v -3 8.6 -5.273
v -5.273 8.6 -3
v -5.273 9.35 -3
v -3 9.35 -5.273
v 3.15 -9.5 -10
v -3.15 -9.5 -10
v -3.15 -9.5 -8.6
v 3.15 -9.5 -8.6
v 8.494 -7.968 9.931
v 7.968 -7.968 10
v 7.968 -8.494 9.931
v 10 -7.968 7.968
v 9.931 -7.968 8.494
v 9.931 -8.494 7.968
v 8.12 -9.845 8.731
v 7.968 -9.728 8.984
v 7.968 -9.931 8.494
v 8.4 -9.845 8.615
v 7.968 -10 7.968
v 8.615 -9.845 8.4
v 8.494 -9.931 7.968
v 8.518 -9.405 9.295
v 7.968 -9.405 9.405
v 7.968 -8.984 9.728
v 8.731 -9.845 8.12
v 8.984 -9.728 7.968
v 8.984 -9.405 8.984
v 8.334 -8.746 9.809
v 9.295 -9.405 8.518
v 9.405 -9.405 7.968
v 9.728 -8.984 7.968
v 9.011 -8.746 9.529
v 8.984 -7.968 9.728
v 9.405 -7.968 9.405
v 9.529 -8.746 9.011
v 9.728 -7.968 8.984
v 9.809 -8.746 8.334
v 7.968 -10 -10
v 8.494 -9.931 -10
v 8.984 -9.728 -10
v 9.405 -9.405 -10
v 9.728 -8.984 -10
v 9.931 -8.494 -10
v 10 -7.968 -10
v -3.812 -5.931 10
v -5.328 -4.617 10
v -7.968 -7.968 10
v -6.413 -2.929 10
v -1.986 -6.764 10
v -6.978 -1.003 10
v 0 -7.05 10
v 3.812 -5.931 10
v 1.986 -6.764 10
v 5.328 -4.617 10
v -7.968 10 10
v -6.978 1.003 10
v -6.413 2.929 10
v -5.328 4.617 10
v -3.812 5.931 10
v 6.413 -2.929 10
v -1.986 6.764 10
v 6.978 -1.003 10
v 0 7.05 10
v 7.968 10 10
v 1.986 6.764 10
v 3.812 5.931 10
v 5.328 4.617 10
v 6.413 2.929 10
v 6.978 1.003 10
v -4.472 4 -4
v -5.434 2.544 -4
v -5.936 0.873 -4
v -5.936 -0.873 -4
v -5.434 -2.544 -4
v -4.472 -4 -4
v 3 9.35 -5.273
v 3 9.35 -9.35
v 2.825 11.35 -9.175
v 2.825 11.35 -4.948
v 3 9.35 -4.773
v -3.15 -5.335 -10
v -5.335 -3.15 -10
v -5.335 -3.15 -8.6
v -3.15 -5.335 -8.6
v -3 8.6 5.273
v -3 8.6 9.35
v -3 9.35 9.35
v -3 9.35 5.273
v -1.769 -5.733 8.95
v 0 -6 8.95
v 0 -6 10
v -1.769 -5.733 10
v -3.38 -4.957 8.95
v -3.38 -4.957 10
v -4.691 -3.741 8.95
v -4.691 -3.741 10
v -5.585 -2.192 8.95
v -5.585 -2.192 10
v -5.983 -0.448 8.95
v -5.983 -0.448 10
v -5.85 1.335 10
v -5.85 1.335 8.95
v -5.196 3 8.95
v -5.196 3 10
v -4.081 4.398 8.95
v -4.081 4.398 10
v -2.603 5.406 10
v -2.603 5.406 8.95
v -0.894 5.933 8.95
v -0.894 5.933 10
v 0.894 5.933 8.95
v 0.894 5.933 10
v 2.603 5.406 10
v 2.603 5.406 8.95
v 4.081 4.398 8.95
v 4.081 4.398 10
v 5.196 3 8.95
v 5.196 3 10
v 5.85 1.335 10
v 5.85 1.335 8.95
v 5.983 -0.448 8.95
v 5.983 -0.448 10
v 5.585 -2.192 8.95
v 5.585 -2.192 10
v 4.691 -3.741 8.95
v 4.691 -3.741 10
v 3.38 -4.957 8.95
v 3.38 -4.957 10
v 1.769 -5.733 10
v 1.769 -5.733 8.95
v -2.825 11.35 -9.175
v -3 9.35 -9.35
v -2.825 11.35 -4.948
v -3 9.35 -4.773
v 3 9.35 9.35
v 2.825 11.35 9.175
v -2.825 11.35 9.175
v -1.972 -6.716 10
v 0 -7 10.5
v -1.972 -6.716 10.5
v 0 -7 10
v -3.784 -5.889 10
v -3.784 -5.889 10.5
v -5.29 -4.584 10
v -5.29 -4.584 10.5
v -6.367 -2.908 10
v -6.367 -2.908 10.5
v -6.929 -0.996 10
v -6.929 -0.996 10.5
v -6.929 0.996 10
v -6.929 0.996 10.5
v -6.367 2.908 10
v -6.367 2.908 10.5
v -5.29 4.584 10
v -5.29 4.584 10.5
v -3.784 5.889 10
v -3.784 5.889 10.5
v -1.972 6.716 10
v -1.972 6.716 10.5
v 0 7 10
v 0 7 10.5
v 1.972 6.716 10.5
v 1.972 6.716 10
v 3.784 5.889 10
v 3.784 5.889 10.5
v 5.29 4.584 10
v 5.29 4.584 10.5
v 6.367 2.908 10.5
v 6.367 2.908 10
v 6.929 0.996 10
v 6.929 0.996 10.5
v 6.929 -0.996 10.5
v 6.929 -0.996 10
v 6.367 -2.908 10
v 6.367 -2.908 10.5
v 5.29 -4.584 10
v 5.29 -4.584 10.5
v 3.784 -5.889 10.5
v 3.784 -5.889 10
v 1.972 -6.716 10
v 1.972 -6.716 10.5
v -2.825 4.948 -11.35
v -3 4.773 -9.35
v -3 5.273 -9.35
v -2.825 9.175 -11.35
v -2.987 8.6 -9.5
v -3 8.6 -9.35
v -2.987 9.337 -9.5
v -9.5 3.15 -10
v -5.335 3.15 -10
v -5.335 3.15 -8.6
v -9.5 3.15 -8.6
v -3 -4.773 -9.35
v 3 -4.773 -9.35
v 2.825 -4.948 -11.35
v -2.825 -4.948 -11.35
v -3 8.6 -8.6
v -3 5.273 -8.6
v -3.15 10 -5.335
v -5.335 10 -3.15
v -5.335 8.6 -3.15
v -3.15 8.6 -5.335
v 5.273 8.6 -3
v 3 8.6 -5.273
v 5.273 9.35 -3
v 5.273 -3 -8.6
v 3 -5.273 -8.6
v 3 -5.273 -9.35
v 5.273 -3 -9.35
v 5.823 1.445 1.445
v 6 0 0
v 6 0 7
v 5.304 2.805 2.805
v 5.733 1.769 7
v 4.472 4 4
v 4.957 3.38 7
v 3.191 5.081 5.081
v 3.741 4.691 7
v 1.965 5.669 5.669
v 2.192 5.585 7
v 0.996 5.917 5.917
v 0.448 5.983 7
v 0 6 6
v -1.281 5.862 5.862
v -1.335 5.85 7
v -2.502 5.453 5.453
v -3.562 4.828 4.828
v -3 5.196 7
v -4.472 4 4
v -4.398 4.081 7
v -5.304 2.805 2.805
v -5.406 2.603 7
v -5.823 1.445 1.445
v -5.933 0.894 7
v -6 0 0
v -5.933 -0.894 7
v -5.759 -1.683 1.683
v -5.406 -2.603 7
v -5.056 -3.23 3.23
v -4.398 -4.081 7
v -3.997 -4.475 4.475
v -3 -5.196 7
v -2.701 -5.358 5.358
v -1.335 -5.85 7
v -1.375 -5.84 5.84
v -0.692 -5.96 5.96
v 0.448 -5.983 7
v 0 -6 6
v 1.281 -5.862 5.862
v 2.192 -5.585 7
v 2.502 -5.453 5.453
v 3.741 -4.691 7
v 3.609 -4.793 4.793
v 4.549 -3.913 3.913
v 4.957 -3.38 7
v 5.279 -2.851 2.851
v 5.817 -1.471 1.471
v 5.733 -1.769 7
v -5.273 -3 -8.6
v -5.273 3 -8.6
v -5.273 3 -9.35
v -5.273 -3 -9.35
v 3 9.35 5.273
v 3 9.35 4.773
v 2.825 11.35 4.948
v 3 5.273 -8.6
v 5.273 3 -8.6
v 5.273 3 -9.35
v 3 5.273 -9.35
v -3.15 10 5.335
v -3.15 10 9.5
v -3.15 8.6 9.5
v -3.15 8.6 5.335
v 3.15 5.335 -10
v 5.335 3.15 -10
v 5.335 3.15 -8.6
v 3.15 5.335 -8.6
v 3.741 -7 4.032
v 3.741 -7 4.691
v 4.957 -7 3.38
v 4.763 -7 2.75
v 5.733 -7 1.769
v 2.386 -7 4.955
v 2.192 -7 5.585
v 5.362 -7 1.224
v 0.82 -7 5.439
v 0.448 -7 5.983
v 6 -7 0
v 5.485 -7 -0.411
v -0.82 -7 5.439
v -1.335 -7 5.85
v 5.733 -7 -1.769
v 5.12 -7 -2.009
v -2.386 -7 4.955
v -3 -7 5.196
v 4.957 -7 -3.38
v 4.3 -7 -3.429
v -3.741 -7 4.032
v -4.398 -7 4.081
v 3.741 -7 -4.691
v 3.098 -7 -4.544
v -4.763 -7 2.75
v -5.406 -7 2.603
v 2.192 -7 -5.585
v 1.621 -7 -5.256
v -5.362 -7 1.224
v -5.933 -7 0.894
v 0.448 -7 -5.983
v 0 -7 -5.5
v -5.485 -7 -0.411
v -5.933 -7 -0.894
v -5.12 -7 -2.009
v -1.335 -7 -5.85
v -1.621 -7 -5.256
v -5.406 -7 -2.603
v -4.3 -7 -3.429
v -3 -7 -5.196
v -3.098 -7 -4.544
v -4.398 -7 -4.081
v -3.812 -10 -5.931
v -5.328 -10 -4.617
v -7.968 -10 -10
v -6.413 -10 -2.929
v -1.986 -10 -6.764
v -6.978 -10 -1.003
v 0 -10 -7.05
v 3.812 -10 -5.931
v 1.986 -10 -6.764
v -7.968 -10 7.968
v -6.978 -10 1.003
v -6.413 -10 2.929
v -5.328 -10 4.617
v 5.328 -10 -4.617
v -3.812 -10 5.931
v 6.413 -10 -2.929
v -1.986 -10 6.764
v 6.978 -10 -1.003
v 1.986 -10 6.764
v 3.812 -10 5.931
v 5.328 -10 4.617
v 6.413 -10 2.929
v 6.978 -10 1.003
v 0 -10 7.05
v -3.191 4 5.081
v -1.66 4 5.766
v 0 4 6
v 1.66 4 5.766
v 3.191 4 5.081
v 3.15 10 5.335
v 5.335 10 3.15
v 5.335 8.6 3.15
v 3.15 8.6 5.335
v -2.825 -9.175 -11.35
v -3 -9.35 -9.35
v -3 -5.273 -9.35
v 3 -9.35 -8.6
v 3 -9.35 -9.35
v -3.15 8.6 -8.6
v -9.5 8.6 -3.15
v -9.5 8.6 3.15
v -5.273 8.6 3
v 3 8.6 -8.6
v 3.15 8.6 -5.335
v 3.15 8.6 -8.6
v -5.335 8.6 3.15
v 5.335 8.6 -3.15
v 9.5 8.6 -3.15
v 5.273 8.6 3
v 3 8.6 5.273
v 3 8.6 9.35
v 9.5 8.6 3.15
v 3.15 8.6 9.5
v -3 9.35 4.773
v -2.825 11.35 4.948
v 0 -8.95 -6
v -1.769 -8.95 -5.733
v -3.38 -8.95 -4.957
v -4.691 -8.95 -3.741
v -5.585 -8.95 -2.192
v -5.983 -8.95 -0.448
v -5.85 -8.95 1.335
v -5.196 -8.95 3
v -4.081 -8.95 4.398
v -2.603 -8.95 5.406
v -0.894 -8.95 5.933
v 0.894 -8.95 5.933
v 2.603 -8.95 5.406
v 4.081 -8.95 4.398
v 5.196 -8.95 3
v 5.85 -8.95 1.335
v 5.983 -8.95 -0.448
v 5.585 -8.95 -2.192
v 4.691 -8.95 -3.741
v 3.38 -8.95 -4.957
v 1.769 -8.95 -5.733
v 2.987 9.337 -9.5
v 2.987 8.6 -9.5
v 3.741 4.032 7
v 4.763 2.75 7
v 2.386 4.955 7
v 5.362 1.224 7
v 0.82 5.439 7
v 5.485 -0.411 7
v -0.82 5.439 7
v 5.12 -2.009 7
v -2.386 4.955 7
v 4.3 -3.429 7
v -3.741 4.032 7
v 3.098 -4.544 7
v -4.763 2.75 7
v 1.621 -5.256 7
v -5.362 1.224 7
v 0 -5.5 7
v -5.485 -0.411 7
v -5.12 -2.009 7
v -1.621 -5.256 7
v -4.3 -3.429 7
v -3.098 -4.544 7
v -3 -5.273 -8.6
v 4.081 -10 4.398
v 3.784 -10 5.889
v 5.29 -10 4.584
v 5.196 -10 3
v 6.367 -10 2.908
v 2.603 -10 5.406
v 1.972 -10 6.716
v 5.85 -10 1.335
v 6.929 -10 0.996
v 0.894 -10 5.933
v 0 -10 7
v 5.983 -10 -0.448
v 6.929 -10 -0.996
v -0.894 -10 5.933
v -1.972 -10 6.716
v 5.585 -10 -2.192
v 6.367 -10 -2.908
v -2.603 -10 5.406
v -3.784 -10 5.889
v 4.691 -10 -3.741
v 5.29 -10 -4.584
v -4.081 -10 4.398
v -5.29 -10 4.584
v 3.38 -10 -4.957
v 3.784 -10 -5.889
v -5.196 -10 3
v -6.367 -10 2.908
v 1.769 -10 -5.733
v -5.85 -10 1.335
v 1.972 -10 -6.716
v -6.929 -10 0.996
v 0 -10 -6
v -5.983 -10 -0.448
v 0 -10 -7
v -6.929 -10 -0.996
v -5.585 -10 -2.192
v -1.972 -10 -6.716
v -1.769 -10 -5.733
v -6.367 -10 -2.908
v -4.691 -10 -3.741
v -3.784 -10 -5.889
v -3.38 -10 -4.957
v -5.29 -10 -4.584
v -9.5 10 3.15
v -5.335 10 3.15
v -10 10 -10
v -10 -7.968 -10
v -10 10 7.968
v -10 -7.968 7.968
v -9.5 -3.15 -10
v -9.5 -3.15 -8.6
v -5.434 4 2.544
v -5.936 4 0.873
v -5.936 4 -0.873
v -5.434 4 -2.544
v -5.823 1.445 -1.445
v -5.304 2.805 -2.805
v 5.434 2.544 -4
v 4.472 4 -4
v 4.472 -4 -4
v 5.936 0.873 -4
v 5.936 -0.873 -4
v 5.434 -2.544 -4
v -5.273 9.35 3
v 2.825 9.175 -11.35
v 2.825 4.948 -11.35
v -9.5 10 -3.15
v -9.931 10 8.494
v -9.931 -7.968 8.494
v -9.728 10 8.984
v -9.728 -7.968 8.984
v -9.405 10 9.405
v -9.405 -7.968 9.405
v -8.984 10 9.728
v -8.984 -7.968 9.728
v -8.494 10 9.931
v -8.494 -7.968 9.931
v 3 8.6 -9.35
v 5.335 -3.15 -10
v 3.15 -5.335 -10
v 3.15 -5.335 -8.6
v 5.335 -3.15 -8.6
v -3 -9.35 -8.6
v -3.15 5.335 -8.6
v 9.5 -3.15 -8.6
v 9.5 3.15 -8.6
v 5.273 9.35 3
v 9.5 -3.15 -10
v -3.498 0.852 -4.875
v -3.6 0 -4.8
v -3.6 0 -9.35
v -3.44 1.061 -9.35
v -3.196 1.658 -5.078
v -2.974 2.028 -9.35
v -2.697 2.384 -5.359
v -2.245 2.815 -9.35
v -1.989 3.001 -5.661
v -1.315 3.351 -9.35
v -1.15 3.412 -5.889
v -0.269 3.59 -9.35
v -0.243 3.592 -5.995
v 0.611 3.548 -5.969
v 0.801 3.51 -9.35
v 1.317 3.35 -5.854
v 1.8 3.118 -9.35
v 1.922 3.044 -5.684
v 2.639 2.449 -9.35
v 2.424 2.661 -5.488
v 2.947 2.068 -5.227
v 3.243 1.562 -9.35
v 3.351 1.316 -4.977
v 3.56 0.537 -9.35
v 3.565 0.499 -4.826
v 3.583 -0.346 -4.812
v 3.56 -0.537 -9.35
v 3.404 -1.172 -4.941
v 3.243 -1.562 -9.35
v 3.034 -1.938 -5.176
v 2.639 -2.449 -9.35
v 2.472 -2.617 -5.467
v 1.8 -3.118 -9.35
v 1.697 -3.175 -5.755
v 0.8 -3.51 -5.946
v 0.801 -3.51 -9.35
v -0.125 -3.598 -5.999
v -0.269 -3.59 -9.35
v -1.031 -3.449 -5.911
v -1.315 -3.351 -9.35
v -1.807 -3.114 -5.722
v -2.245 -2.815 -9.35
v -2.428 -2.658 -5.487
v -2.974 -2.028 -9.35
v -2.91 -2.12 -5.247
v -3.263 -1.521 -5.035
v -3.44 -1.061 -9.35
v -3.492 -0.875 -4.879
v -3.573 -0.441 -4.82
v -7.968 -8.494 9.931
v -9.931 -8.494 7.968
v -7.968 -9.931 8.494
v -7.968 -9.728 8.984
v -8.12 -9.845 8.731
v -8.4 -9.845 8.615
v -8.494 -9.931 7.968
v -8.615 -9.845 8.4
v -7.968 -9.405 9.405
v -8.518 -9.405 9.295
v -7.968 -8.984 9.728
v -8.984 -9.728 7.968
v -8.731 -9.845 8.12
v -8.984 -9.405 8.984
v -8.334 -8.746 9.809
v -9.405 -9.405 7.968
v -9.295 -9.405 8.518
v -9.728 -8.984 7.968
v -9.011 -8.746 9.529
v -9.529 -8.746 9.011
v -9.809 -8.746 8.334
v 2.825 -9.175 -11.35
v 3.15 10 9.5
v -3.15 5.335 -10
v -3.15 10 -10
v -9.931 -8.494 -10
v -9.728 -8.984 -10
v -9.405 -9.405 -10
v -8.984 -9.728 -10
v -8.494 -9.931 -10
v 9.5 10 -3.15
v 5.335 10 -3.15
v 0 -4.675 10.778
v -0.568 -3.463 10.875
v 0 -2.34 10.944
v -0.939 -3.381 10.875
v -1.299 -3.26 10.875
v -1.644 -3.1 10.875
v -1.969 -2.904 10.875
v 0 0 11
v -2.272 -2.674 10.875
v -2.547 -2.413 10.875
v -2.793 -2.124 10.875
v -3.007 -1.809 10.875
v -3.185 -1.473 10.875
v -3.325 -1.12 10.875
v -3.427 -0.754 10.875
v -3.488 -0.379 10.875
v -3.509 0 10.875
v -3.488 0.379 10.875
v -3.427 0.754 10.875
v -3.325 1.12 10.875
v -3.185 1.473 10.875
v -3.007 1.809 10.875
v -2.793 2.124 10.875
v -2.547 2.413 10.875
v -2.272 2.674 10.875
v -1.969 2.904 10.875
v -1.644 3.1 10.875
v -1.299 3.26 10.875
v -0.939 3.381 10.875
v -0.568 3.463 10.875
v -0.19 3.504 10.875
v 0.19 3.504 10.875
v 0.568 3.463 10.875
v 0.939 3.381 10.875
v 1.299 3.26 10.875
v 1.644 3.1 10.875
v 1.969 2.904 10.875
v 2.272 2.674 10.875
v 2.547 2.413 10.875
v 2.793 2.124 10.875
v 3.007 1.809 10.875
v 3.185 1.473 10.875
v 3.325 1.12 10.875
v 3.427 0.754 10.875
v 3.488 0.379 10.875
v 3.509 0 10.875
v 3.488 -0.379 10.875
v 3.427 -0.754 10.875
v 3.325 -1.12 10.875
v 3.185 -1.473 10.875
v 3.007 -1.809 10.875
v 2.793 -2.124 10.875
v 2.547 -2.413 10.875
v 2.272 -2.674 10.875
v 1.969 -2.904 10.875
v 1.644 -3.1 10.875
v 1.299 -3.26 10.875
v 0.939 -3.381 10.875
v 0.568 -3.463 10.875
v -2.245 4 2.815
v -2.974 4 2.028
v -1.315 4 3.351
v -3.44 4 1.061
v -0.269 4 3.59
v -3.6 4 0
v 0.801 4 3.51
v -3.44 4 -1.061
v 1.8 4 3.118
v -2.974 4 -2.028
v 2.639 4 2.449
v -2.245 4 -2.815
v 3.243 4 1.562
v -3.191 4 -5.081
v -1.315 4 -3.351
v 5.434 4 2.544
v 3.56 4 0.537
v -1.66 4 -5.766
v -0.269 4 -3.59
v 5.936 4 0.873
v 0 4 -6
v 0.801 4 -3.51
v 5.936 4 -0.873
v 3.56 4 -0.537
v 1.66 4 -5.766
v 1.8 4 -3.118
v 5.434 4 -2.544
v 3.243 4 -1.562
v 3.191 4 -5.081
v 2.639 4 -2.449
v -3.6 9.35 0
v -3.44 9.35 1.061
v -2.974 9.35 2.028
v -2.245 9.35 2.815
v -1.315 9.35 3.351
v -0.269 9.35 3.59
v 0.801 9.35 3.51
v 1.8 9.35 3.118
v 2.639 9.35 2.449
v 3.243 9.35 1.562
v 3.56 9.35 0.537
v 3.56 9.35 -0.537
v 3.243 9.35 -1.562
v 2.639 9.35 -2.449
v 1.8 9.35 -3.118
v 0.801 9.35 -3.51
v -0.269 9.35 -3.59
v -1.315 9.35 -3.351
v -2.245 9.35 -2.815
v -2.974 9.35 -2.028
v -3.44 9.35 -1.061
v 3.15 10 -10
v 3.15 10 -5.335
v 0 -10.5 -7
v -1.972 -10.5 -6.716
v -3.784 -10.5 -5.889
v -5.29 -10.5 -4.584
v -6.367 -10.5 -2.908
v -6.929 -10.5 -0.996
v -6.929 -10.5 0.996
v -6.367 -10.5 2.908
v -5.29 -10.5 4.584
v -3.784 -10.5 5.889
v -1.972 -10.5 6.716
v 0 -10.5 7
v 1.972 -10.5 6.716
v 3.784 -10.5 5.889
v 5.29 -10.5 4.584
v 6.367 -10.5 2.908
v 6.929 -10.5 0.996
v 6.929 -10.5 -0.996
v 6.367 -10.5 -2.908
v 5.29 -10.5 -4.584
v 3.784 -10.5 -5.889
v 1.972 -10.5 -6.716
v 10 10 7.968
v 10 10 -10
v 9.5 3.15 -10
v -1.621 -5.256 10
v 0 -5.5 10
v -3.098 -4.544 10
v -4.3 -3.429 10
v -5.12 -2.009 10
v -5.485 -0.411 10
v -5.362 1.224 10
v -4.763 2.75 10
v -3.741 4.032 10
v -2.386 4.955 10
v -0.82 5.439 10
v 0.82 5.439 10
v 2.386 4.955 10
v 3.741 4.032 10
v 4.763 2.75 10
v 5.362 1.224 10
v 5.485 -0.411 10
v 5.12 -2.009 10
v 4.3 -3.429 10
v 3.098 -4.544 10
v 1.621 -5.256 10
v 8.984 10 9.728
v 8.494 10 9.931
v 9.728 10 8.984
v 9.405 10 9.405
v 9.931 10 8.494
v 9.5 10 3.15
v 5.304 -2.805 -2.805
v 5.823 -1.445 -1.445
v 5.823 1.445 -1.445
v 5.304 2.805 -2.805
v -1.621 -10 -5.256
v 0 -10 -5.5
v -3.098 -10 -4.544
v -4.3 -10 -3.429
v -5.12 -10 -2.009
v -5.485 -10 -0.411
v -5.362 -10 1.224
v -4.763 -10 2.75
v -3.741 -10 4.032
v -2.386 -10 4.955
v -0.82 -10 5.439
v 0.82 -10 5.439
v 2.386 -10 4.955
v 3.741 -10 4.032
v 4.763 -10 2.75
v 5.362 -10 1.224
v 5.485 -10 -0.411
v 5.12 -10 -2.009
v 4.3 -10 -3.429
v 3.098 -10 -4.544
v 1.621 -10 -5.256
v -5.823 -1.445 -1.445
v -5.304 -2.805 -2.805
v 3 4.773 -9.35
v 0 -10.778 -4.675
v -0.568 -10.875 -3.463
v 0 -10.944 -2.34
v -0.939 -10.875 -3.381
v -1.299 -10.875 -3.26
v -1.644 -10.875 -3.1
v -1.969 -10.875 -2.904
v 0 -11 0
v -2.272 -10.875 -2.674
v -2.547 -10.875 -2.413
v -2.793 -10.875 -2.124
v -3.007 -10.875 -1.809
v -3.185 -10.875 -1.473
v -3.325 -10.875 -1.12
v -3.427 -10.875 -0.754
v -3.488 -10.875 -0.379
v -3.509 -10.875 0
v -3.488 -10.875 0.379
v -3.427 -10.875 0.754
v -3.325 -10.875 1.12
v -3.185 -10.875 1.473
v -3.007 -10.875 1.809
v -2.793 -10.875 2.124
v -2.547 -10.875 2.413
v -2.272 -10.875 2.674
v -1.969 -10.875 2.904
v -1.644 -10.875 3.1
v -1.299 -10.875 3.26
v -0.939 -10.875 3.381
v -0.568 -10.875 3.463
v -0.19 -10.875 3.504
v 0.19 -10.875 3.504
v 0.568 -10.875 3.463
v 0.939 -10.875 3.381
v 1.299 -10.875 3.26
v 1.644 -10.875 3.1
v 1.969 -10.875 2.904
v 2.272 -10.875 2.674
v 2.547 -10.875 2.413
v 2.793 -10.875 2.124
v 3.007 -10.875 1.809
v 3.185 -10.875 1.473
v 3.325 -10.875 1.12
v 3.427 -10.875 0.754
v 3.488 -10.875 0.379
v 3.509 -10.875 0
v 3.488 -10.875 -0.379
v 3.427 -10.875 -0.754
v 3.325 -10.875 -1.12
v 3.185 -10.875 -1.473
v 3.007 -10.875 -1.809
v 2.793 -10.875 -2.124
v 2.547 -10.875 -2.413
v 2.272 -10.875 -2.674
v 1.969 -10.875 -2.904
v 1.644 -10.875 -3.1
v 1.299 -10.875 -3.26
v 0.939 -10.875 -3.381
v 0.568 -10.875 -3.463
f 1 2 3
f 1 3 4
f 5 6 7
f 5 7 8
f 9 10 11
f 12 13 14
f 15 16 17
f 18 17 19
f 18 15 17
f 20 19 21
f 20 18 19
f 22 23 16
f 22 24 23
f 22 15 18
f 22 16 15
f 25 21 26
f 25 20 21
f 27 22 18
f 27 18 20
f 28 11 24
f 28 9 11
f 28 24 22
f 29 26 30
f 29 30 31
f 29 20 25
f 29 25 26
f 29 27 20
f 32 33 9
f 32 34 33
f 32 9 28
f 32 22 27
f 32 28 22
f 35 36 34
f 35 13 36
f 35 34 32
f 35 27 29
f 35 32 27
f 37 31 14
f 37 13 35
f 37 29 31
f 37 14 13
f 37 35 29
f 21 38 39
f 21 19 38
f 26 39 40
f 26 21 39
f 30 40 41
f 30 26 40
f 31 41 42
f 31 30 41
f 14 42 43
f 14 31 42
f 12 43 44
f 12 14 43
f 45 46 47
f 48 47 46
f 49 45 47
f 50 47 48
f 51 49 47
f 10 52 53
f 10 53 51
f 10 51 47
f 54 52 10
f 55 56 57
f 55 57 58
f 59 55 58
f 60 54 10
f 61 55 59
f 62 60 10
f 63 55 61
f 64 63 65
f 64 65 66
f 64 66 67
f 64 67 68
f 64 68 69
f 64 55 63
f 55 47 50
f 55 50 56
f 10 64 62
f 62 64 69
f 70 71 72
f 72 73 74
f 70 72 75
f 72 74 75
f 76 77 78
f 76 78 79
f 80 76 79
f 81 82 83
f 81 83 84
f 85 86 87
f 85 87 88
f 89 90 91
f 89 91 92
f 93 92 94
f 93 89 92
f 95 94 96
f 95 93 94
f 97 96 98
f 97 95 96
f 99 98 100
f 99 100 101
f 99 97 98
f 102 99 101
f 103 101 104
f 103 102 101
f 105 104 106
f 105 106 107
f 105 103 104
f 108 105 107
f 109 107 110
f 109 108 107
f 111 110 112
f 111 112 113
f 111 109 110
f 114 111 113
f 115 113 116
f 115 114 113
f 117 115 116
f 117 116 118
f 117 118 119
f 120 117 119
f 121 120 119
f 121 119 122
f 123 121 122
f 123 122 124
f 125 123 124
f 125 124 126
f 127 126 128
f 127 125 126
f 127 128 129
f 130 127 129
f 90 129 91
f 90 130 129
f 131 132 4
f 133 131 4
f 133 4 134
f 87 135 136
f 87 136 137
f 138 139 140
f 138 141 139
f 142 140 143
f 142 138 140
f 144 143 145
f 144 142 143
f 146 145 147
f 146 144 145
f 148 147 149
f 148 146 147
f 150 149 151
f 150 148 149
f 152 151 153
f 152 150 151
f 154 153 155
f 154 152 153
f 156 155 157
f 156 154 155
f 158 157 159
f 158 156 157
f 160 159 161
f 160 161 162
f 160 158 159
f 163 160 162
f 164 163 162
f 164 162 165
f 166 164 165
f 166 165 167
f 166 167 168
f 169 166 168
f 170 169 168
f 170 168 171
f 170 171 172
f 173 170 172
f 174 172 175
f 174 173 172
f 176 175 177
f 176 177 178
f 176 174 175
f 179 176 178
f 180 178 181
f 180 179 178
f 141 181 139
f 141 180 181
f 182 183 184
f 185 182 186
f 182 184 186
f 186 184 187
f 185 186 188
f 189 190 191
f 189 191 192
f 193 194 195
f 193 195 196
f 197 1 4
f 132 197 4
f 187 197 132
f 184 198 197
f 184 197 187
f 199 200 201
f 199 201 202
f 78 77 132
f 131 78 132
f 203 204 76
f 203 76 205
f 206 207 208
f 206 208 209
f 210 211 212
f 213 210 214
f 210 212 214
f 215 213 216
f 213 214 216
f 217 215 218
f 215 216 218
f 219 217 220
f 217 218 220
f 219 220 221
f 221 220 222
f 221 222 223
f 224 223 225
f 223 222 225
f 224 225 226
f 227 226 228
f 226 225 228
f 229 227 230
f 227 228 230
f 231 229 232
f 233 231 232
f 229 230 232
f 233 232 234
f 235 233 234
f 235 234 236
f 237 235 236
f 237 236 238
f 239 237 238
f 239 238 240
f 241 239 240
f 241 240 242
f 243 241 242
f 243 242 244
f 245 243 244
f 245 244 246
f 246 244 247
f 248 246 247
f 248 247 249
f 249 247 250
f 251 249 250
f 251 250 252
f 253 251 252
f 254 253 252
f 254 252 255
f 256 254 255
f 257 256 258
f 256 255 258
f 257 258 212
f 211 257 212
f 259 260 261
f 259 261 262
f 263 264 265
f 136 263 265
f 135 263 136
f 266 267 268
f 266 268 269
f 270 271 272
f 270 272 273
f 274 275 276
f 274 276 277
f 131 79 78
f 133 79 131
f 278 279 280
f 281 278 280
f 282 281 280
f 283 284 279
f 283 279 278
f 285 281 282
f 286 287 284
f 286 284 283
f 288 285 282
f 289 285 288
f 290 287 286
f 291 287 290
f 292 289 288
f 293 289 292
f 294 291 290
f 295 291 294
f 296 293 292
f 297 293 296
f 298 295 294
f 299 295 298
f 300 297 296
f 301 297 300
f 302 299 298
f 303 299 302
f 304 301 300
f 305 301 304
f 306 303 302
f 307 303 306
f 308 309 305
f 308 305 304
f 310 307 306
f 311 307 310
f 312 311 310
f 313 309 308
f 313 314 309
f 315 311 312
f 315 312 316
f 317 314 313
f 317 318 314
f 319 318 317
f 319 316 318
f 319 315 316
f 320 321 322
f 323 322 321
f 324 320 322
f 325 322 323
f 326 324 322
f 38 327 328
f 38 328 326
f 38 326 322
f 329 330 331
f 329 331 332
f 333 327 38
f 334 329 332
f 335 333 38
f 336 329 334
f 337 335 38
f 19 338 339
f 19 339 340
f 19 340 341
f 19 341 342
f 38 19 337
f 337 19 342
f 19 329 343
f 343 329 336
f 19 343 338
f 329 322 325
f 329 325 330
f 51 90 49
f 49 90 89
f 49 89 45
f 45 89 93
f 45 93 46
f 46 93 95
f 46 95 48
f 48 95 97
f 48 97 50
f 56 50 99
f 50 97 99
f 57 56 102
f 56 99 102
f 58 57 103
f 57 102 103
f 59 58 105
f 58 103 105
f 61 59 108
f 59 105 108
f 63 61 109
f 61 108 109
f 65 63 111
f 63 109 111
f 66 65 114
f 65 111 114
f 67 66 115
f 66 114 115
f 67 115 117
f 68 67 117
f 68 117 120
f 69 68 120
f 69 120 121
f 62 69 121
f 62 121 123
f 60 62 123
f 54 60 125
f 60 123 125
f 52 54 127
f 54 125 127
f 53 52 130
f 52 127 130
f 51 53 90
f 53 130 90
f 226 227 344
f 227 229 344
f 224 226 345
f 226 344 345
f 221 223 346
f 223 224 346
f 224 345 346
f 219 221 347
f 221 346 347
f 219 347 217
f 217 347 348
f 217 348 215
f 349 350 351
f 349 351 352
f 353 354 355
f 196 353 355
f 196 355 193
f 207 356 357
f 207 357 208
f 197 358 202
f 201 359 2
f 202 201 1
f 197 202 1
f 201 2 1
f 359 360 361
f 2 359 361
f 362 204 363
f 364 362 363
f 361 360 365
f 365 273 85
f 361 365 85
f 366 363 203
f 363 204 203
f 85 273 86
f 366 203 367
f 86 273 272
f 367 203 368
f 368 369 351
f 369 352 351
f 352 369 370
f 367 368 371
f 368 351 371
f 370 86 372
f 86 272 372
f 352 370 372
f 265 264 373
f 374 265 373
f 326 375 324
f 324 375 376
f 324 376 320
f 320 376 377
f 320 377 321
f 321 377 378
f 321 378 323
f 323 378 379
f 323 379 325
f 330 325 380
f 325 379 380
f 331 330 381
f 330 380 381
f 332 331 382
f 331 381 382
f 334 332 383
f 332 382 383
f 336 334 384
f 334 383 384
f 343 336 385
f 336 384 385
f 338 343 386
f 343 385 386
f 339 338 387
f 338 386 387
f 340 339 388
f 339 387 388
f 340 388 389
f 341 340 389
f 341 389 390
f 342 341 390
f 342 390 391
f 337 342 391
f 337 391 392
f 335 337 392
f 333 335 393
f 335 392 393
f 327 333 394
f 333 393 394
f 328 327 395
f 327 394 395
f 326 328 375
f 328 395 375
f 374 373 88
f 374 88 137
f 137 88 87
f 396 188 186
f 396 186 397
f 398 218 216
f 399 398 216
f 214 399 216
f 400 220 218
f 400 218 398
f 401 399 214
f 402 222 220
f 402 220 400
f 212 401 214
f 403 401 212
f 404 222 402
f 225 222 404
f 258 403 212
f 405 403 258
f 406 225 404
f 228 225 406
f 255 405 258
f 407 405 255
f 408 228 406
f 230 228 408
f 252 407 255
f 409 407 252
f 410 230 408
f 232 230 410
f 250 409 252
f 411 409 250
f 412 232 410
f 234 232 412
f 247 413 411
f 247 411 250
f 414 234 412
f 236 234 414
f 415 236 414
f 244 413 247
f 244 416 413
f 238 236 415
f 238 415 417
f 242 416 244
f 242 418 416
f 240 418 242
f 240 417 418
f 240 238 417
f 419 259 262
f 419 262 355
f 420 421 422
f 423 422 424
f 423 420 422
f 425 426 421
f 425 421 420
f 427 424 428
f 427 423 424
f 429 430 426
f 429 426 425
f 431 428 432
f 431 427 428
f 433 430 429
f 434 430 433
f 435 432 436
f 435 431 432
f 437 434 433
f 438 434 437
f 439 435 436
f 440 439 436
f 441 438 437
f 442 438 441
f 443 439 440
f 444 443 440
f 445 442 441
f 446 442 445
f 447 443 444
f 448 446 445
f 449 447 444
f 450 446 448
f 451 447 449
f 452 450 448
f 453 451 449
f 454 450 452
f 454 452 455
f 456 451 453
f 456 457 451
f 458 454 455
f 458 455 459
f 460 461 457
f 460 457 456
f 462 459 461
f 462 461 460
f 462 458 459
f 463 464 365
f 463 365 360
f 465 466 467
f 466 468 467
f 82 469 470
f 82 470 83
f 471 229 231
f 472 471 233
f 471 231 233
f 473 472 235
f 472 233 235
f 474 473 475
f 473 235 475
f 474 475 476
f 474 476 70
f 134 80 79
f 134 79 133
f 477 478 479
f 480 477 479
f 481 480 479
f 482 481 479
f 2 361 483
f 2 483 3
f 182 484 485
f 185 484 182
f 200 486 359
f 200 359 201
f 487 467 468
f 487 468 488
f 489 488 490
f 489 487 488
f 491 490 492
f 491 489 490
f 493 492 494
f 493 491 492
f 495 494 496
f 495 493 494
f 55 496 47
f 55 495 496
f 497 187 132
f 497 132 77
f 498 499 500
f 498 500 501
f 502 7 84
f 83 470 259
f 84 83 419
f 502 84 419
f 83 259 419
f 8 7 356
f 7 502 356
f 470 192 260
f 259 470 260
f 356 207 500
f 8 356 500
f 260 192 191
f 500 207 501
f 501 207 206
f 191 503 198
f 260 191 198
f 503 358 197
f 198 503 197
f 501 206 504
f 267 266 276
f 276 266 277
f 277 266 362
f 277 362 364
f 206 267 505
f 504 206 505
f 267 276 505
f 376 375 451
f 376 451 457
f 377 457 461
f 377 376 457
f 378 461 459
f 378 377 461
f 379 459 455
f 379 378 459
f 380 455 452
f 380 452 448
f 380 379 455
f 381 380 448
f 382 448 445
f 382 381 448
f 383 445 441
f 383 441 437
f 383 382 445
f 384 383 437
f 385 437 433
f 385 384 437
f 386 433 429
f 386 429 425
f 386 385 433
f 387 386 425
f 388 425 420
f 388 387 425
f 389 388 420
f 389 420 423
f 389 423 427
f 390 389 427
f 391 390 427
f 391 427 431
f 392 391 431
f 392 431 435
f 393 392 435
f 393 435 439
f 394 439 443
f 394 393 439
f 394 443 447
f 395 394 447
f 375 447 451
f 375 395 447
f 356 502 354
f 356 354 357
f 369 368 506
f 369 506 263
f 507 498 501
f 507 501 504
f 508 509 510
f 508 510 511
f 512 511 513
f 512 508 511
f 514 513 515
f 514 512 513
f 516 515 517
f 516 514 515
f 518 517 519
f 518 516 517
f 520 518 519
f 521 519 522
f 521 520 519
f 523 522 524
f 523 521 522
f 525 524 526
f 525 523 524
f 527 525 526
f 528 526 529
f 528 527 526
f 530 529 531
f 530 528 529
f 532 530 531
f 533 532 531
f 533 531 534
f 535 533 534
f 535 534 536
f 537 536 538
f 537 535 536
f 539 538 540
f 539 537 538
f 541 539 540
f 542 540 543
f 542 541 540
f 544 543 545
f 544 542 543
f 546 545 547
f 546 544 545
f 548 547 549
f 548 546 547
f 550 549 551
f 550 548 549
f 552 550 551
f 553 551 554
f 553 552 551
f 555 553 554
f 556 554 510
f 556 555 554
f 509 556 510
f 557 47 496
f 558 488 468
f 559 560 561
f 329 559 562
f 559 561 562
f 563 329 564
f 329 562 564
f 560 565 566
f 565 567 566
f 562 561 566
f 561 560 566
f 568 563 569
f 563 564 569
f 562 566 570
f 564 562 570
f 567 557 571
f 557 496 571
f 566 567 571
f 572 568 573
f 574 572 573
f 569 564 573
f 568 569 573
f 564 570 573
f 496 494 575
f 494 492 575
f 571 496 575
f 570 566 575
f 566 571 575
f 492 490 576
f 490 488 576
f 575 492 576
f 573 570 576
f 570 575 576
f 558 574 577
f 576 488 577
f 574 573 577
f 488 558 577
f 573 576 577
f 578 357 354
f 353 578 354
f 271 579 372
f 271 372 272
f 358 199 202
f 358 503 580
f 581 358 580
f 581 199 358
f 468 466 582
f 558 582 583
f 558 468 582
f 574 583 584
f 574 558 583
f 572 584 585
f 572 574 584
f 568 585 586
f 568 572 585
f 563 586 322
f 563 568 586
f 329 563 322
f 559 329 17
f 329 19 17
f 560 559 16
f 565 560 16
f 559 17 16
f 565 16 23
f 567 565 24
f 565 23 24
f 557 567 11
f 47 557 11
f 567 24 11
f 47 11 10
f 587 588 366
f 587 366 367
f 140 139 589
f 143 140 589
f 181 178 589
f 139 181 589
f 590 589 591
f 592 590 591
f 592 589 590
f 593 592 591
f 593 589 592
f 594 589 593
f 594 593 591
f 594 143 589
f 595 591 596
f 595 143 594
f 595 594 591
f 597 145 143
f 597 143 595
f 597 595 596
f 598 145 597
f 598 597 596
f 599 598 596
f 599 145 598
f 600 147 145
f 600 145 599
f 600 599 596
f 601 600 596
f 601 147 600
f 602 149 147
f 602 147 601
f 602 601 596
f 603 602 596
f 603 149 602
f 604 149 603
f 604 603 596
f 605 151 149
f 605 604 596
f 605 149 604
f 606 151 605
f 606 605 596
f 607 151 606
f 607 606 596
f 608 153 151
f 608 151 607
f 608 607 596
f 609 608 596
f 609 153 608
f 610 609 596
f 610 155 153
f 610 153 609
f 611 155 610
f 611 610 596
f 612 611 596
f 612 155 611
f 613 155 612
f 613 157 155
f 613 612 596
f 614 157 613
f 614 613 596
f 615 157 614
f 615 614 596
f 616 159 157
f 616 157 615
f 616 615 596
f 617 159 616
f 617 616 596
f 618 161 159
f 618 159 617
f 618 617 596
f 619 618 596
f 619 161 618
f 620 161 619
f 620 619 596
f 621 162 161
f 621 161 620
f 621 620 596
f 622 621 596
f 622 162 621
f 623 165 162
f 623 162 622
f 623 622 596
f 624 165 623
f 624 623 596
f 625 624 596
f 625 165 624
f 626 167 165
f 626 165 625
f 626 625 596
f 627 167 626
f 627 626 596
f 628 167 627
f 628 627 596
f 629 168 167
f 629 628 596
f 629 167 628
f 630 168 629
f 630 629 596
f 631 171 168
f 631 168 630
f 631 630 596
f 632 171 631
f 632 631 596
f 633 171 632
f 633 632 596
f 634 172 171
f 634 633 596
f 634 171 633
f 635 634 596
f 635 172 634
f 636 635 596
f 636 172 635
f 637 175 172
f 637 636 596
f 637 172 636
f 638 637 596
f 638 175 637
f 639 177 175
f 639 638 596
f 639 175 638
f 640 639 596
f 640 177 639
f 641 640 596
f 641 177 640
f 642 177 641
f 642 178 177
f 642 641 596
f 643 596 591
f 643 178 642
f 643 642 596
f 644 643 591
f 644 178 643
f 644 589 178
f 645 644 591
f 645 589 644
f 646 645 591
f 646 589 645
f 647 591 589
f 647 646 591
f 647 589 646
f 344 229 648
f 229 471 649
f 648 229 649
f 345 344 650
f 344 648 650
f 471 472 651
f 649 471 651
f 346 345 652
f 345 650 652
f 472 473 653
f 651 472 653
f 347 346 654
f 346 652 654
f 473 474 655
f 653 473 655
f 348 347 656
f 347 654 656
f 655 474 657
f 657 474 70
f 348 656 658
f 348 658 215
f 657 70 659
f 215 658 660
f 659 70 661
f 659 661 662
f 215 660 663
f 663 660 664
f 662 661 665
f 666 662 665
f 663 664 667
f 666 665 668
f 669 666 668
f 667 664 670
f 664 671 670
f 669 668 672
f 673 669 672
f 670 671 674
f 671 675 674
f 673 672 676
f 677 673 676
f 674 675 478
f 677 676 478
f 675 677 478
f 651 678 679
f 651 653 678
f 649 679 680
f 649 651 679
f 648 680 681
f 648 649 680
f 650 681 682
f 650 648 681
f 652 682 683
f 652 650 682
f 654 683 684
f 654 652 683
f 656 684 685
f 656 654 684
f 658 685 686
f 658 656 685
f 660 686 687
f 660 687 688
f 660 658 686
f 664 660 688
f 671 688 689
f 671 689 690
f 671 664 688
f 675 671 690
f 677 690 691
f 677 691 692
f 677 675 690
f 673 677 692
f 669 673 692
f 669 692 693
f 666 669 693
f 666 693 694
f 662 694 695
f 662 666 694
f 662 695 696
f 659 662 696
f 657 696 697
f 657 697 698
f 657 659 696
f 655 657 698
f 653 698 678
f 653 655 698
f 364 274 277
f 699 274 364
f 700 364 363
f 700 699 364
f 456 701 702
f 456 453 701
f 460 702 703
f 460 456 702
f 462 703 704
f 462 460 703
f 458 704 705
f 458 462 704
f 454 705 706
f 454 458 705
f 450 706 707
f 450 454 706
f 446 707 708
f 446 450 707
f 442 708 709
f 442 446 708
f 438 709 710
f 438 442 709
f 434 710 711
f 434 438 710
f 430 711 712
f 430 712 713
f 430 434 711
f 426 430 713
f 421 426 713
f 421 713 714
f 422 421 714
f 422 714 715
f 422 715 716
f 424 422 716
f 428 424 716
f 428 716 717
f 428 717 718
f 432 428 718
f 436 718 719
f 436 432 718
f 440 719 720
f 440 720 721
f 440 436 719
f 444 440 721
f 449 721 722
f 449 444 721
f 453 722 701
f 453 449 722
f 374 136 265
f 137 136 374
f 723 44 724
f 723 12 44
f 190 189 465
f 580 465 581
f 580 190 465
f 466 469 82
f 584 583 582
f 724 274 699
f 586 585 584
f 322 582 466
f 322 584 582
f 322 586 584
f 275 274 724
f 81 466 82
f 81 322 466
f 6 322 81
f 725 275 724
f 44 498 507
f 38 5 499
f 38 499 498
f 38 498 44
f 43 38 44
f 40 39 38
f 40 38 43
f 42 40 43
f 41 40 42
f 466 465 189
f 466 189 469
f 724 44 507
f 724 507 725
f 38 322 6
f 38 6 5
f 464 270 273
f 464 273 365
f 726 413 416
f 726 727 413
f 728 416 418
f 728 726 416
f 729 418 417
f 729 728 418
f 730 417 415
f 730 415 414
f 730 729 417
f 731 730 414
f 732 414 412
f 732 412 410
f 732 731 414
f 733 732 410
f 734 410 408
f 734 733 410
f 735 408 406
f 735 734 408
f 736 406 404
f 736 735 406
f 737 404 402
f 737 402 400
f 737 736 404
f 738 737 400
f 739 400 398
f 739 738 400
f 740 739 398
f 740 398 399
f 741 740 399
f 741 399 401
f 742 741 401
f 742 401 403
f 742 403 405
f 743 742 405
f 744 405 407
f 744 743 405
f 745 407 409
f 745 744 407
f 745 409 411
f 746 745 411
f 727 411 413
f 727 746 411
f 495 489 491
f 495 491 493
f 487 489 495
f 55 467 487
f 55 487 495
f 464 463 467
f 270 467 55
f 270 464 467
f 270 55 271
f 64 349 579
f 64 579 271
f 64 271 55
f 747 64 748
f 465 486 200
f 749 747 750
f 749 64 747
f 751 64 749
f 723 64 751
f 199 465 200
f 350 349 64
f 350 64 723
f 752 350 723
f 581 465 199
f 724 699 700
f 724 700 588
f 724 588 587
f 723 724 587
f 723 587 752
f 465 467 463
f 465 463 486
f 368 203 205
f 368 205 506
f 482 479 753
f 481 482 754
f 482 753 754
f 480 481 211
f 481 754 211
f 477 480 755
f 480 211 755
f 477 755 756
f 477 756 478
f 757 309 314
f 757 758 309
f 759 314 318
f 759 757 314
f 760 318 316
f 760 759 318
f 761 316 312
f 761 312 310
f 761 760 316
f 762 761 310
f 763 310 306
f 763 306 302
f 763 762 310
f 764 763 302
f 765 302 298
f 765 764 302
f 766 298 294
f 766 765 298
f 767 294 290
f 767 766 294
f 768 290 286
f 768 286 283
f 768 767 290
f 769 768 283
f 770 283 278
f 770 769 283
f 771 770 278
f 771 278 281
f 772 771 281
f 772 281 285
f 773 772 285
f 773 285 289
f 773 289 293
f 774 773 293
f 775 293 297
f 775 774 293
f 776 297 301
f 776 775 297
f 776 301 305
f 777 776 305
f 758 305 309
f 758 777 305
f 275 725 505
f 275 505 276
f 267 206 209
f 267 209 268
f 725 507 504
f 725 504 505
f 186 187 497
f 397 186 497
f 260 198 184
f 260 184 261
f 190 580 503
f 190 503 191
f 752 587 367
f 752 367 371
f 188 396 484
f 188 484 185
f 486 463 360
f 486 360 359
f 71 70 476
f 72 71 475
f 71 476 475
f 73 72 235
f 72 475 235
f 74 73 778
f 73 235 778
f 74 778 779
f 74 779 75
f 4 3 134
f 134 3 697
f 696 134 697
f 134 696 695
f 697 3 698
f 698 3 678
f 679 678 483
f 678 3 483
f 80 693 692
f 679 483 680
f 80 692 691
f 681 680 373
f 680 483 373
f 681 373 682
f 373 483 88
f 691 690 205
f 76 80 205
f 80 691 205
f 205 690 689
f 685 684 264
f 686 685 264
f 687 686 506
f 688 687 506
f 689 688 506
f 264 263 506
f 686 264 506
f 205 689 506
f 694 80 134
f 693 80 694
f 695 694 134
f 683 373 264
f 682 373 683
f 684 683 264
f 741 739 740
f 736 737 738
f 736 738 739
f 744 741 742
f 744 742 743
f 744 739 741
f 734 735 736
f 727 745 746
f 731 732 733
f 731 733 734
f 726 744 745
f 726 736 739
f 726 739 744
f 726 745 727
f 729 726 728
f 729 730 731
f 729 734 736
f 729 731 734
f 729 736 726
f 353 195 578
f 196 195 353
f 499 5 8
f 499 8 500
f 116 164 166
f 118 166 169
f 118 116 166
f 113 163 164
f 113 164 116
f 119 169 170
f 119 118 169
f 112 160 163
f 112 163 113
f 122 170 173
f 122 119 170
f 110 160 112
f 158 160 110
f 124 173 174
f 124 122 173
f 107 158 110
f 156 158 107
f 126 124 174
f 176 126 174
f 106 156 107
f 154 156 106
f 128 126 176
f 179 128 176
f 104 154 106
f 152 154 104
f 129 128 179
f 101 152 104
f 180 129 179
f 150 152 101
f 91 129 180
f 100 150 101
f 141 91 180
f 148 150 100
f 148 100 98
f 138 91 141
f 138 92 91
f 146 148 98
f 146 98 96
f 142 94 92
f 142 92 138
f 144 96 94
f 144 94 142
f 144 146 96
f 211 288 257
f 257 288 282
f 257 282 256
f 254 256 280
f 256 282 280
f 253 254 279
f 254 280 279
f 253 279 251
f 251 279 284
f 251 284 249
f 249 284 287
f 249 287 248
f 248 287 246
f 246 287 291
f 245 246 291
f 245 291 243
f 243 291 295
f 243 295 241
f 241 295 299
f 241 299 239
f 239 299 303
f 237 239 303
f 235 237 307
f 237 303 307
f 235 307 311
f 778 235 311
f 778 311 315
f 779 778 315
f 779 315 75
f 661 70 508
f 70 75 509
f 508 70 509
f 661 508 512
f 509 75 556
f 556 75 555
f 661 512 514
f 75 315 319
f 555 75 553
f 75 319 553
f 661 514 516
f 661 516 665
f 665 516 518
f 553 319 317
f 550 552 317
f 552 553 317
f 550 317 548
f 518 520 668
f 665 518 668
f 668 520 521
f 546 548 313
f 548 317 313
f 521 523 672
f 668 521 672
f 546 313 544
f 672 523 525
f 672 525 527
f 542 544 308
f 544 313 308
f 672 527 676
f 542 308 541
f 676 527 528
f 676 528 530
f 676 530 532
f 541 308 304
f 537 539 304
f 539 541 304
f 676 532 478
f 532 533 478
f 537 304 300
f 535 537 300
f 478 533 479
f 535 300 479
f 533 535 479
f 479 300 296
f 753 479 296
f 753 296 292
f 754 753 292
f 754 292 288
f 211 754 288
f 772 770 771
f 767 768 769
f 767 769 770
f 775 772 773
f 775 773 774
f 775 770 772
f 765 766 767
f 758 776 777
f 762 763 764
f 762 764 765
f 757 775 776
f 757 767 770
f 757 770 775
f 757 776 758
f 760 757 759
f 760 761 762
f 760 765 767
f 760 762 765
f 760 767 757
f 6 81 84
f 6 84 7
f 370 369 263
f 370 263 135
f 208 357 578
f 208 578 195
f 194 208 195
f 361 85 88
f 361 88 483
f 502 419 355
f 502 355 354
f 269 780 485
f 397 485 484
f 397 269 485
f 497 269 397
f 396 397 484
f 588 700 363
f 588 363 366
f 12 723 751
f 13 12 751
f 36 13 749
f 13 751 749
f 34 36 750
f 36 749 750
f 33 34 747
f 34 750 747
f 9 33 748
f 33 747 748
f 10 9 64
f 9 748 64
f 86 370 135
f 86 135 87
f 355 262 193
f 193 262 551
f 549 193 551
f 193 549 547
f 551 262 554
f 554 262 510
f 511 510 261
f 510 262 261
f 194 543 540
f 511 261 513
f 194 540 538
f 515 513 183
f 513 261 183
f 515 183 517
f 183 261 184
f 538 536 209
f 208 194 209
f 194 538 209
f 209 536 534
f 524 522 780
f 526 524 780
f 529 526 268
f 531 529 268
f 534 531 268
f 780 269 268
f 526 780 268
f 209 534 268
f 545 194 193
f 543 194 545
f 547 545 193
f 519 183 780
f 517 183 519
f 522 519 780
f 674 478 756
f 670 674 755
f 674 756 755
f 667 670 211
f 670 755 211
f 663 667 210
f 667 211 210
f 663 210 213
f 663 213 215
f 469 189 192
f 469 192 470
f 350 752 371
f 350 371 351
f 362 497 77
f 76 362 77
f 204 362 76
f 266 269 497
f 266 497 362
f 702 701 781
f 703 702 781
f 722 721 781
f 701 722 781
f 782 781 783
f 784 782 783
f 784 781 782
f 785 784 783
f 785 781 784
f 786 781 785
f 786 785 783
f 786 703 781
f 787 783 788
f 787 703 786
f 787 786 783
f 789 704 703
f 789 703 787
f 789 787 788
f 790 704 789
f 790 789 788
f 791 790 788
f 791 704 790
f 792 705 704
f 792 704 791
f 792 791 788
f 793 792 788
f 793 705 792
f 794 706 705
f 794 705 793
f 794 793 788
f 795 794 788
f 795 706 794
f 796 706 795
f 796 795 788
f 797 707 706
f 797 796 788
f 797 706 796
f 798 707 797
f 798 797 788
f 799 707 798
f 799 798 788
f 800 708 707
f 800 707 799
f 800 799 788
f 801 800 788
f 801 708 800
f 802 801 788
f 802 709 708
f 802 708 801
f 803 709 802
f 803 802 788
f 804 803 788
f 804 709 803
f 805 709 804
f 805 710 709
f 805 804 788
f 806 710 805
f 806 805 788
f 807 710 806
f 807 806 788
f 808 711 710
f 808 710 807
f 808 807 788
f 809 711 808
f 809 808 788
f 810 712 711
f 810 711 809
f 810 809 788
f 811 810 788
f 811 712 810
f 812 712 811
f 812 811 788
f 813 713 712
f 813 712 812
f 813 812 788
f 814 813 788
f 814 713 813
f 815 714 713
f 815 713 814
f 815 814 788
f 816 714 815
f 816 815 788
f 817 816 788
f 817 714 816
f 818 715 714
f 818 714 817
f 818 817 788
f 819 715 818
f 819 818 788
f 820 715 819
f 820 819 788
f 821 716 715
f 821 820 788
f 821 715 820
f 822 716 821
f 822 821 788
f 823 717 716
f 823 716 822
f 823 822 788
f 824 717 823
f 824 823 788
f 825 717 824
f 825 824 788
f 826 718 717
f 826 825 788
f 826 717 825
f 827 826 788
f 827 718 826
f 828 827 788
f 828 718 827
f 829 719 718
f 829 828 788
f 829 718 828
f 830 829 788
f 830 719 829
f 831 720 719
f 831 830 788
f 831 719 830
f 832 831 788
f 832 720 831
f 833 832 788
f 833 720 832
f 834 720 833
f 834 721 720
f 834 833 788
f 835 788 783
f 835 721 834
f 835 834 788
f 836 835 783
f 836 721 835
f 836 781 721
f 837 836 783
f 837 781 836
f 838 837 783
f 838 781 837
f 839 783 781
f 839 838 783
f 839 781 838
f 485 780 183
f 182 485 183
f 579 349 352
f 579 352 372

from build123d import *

# Parameters (mm, degrees)
SKETCH1_W                   = 20
SKETCH1_H                   = 20
EXTRUDE1_DEPTH              = 10
SKETCH2_R                   = 6
CUT_EXTRUDE1_DEPTH          = 25.494897428
EXTRUDE2_START              = -6
SKETCH4_R                   = 6
SKETCH4_R_2                 = 3.6
EXTRUDE2_DEPTH              = 6
CUT_EXTRUDE5_DEPTH          = 1.4
SKETCH13_R                  = 3.6
EXTRUDE3_DEPTH              = 0.75
SKETCH14_W                  = 6
SKETCH14_H                  = 4.57685066
EXTRUDE4_DEPTH              = 2
EXTRUDE4_DRAFT              = 5
EXTRUDE4_PROFILE_2_DEPTH    = 2
EXTRUDE4_PROFILE_2_DRAFT    = 5
FILLET2_R                   = 2.032
CIRPATTERN1_COUNT           = 2
CIRPATTERN1_ANGLE           = 90
CIRPATTERN1_COPY_1_SKETCH_W = 6
CIRPATTERN1_COPY_1_SKETCH_H = 4.57685066
CIRPATTERN1_COPY_1_DEPTH    = 2
CIRPATTERN1_COPY_1_DRAFT    = 5
CIRPATTERN1_COPY_2_SKETCH_W = 6
CIRPATTERN1_COPY_2_SKETCH_H = 4.57685066
CIRPATTERN1_COPY_2_DEPTH    = 2
CIRPATTERN1_COPY_2_DRAFT    = 5
CIRPATTERN1_COPY_3_SKETCH_W = 6
CIRPATTERN1_COPY_3_SKETCH_H = 4.57685066
CIRPATTERN1_COPY_3_DEPTH    = 2
CIRPATTERN1_COPY_3_DRAFT    = 5
SKETCH12_W                  = 6.3
SKETCH12_H                  = 0.5
CUT_EXTRUDE6_DEPTH          = 26.476901303


with BuildPart() as part:
    # Sketch1 → Extrude1 (new, symmetric)
    with BuildSketch(Plane.XY):
        Rectangle(SKETCH1_W, SKETCH1_H)
    extrude(amount=EXTRUDE1_DEPTH, both=True)

    # Sketch2 → Cut-Extrude1 (cut, through all)
    with BuildSketch(Plane.XY.offset(10)):
        Circle(SKETCH2_R)
    cut_extrude1 = extrude(amount=-CUT_EXTRUDE1_DEPTH, mode=Mode.SUBTRACT)

    # Cut-Extrude2 cone 1 section (through the dimple's axis) → Cut-Extrude2 (revolve, cut)
    with BuildSketch(Plane(origin=(0, 0, 10), x_dir=(0, -1, 0), z_dir=(1, 0, 0))):
        Polygon((0, 0), (7.05, 0), (0, 7.05), align=None)
    cut_extrude2 = revolve(axis=Axis((0, 0, 10), (0, 0, -1)), mode=Mode.SUBTRACT)

    # Sketch4 → Extrude2 (add)
    with BuildSketch(Plane(origin=(0, 0, -10), x_dir=(-1, 0, 0), z_dir=(0, 0, -1)).offset(EXTRUDE2_START)):
        with Locations(Location((0, 0, 0), (0, 0, 180))):
            Circle(SKETCH4_R)
        Circle(SKETCH4_R_2, mode=Mode.SUBTRACT)
    extrude2 = extrude(amount=EXTRUDE2_DEPTH)

    # Sketch10 → Cut-Extrude5 (cut)
    with BuildSketch(Plane(origin=(0, 0, -10), x_dir=(-1, 0, 0), z_dir=(0, 0, -1))):
        Polygon((-5.335281374, 3.15), (-3.15, 5.335281374), (-3.15, 9.5), (3.15, 9.5), (3.15, 5.335281374), (5.335281374, 3.15), (9.5, 3.15), (9.5, -3.15), (5.335281374, -3.15), (3.15, -5.335281374), (3.15, -9.5), (-3.15, -9.5), (-3.15, -5.335281374), (-5.335281374, -3.15), (-9.5, -3.15), (-9.5, 3.15), align=None)
    cut_extrude5 = extrude(amount=-CUT_EXTRUDE5_DEPTH, mode=Mode.SUBTRACT)

    # Sketch13 → Extrude3 (add)
    with BuildSketch(Plane(origin=(0, 0, -8.6), x_dir=(-1, 0, 0), z_dir=(0, 0, -1))):
        Polygon((5.27314934, 3), (5.27314934, -3), (3, -5.27314934), (3, -9.35), (-3, -9.35), (-3, -5.27314934), (-5.27314934, -3), (-5.27314934, 3), (-3, 5.27314934), (-3, 9.35), (3, 9.35), (3, 5.27314934), align=None)
        Circle(SKETCH13_R, mode=Mode.SUBTRACT)
    extrude3 = extrude(amount=EXTRUDE3_DEPTH)


with BuildPart() as extrude4_tool:
    # Sketch14 → Extrude4 (with draft: the straight prism first)
    with BuildSketch(Plane(origin=(0, 0, -9.35), x_dir=(-1, 0, 0), z_dir=(0, 0, -1))):
        with Locations((0, 7.06157467)):
            Rectangle(SKETCH14_W, SKETCH14_H)
    extrude(amount=EXTRUDE4_DEPTH)
    # Extrude4: the draft: its side faces are tilted about the plane it starts from
    extrude4_sides = [extrude4_tool.faces().sort_by_distance(p)[0] for p in [
        (3, 7.06157467, -10.35),
        (0, 4.77314934, -10.35),
        (-3, 7.06157467, -10.35),
        (0, 9.35, -10.35),
    ]]
    draft(extrude4_sides, Plane(origin=(0, 0, -9.35), x_dir=(-1, 0, 0), z_dir=(0, 0, -1)), EXTRUDE4_DRAFT)


with BuildPart() as part_1:
    add(part.part)

    # Extrude4: add extrude4_tool
    add(extrude4_tool.part)


with BuildPart() as extrude4_profile_2_tool:
    # Sketch14 → Extrude4 profile 2 (with draft: the straight prism first)
    with BuildSketch(Plane(origin=(0, 0, -9.35), x_dir=(-1, 0, 0), z_dir=(0, 0, -1))):
        with Locations((0, -7.06157467)):
            Rectangle(SKETCH14_W, SKETCH14_H)
    extrude(amount=EXTRUDE4_PROFILE_2_DEPTH)
    # Extrude4 profile 2: the draft: its side faces are tilted about the plane it starts from
    extrude4_profile_2_sides = [extrude4_profile_2_tool.faces().sort_by_distance(p)[0] for p in [
        (0, -9.35, -10.35),
        (-3, -7.06157467, -10.35),
        (0, -4.77314934, -10.35),
        (3, -7.06157467, -10.35),
    ]]
    draft(extrude4_profile_2_sides, Plane(origin=(0, 0, -9.35), x_dir=(-1, 0, 0), z_dir=(0, 0, -1)), EXTRUDE4_PROFILE_2_DRAFT)


with BuildPart() as part_2:
    add(part_1.part)

    # Extrude4 profile 2: add extrude4_profile_2_tool
    add(extrude4_profile_2_tool.part)

    # Fillet2
    fillet2_edges = [part_2.edges().sort_by_distance(p)[0] for p in [
        (10, 0, 10),
        (-10, 0, 10),
        (0, -10, 10),
        (10, -10, 0),
        (-10, -10, 0),
    ]]
    fillet(fillet2_edges, radius=FILLET2_R)

    # Sketch9 → Revolve1 (revolve)
    with BuildSketch(Plane(origin=(0, 0, 0), x_dir=(0, 0, -1), z_dir=(1, 0, 0)), mode=Mode.PRIVATE) as revolve1_sk:
        with BuildLine():
            Line((-10, 7), (-10, 6))
            Line((-10, 6), (-7, 6))
            Line((-7, 6), (-7, 5.5))
            Line((-7, 5.5), (-10, 5.5))
            Line((-10, 5.5), (-10, 0))
            Line((-10, 0), (-11, 0))
            ThreePointArc((-11, 0), (-10.874840967, 3.508917212), (-10.5, 7))
            Line((-10.5, 7), (-10, 7))
        make_face()
    revolve1 = revolve(revolve1_sk.sketch.rotate(Axis((0, 0, 10), (0, 0, -1)), 180), axis=Axis((0, 0, 10), (0, 0, -1)))

    # CirPattern1: Cut-Extrude1, Cut-Extrude2, Extrude2, Cut-Extrude5, Extrude3, Revolve1 ×2 about axis
    cirpattern1_axis = Axis((0, 0, 0), (1, 0, 0))
    add([cut_extrude1.rotate(cirpattern1_axis, i * CIRPATTERN1_ANGLE / (CIRPATTERN1_COUNT - 1)) for i in range(1, CIRPATTERN1_COUNT)], mode=Mode.SUBTRACT)
    add([cut_extrude2.rotate(cirpattern1_axis, i * CIRPATTERN1_ANGLE / (CIRPATTERN1_COUNT - 1)) for i in range(1, CIRPATTERN1_COUNT)], mode=Mode.SUBTRACT)
    add([extrude2.rotate(cirpattern1_axis, i * CIRPATTERN1_ANGLE / (CIRPATTERN1_COUNT - 1)) for i in range(1, CIRPATTERN1_COUNT)])
    add([cut_extrude5.rotate(cirpattern1_axis, i * CIRPATTERN1_ANGLE / (CIRPATTERN1_COUNT - 1)) for i in range(1, CIRPATTERN1_COUNT)], mode=Mode.SUBTRACT)
    add([extrude3.rotate(cirpattern1_axis, i * CIRPATTERN1_ANGLE / (CIRPATTERN1_COUNT - 1)) for i in range(1, CIRPATTERN1_COUNT)])
    add([revolve1.rotate(cirpattern1_axis, i * CIRPATTERN1_ANGLE / (CIRPATTERN1_COUNT - 1)) for i in range(1, CIRPATTERN1_COUNT)])


with BuildPart() as cirpattern1_copy_1_tool:
    # CirPattern1 copy 1 sketch → CirPattern1 copy 1 (with draft: the straight prism first)
    with BuildSketch(Plane(origin=(0, 9.35, 0), x_dir=(-1, 0, 0), z_dir=(0, 1, 0))):
        with Locations((0, 7.06157467)):
            Rectangle(CIRPATTERN1_COPY_1_SKETCH_W, CIRPATTERN1_COPY_1_SKETCH_H)
    extrude(amount=CIRPATTERN1_COPY_1_DEPTH)
    # CirPattern1 copy 1: the draft: its side faces are tilted about the plane it starts from
    cirpattern1_copy_1_sides = [cirpattern1_copy_1_tool.faces().sort_by_distance(p)[0] for p in [
        (3, 10.35, 7.06157467),
        (0, 10.35, 4.77314934),
        (-3, 10.35, 7.06157467),
        (0, 10.35, 9.35),
    ]]
    draft(cirpattern1_copy_1_sides, Plane(origin=(0, 9.35, 0), x_dir=(-1, 0, 0), z_dir=(0, 1, 0)), CIRPATTERN1_COPY_1_DRAFT)


with BuildPart() as part_3:
    add(part_2.part)

    # CirPattern1 copy 1: add cirpattern1_copy_1_tool
    add(cirpattern1_copy_1_tool.part)


with BuildPart() as cirpattern1_copy_2_tool:
    # CirPattern1 copy 2 sketch → CirPattern1 copy 2 (with draft: the straight prism first)
    with BuildSketch(Plane(origin=(0, 9.35, 0), x_dir=(-1, 0, 0), z_dir=(0, 1, 0))):
        with Locations((0, -7.06157467)):
            Rectangle(CIRPATTERN1_COPY_2_SKETCH_W, CIRPATTERN1_COPY_2_SKETCH_H)
    extrude(amount=CIRPATTERN1_COPY_2_DEPTH)
    # CirPattern1 copy 2: the draft: its side faces are tilted about the plane it starts from
    cirpattern1_copy_2_sides = [cirpattern1_copy_2_tool.faces().sort_by_distance(p)[0] for p in [
        (0, 10.35, -9.35),
        (-3, 10.35, -7.06157467),
        (0, 10.35, -4.77314934),
        (3, 10.35, -7.06157467),
    ]]
    draft(cirpattern1_copy_2_sides, Plane(origin=(0, 9.35, 0), x_dir=(-1, 0, 0), z_dir=(0, 1, 0)), CIRPATTERN1_COPY_2_DRAFT)


with BuildPart() as part_4:
    add(part_3.part)

    # CirPattern1 copy 2: add cirpattern1_copy_2_tool
    add(cirpattern1_copy_2_tool.part)


with BuildPart() as cirpattern1_copy_3_tool:
    # CirPattern1 copy 3 sketch → CirPattern1 copy 3 (with draft: the straight prism first)
    with BuildSketch(Plane(origin=(0, 9.35, 0), x_dir=(-1, 0, 0), z_dir=(0, 1, 0))):
        with Locations((0, -7.06157467)):
            Rectangle(CIRPATTERN1_COPY_3_SKETCH_W, CIRPATTERN1_COPY_3_SKETCH_H)
    extrude(amount=CIRPATTERN1_COPY_3_DEPTH)
    # CirPattern1 copy 3: the draft: its side faces are tilted about the plane it starts from
    cirpattern1_copy_3_sides = [cirpattern1_copy_3_tool.faces().sort_by_distance(p)[0] for p in [
        (0, 10.35, -9.35),
        (-3, 10.35, -7.06157467),
        (0, 10.35, -4.77314934),
        (3, 10.35, -7.06157467),
    ]]
    draft(cirpattern1_copy_3_sides, Plane(origin=(0, 9.35, 0), x_dir=(-1, 0, 0), z_dir=(0, 1, 0)), CIRPATTERN1_COPY_3_DRAFT)


with BuildPart() as part_5:
    add(part_4.part)

    # CirPattern1 copy 3: add cirpattern1_copy_3_tool
    add(cirpattern1_copy_3_tool.part)

    # Sketch12 → Cut-Extrude6 (cut, through all)
    with BuildSketch(Plane.XZ.offset(-9.5)):
        with Locations((0, -9.75)):
            Rectangle(SKETCH12_W, SKETCH12_H)
    extrude(amount=-CUT_EXTRUDE6_DEPTH, mode=Mode.SUBTRACT)


solid = part_5.part
